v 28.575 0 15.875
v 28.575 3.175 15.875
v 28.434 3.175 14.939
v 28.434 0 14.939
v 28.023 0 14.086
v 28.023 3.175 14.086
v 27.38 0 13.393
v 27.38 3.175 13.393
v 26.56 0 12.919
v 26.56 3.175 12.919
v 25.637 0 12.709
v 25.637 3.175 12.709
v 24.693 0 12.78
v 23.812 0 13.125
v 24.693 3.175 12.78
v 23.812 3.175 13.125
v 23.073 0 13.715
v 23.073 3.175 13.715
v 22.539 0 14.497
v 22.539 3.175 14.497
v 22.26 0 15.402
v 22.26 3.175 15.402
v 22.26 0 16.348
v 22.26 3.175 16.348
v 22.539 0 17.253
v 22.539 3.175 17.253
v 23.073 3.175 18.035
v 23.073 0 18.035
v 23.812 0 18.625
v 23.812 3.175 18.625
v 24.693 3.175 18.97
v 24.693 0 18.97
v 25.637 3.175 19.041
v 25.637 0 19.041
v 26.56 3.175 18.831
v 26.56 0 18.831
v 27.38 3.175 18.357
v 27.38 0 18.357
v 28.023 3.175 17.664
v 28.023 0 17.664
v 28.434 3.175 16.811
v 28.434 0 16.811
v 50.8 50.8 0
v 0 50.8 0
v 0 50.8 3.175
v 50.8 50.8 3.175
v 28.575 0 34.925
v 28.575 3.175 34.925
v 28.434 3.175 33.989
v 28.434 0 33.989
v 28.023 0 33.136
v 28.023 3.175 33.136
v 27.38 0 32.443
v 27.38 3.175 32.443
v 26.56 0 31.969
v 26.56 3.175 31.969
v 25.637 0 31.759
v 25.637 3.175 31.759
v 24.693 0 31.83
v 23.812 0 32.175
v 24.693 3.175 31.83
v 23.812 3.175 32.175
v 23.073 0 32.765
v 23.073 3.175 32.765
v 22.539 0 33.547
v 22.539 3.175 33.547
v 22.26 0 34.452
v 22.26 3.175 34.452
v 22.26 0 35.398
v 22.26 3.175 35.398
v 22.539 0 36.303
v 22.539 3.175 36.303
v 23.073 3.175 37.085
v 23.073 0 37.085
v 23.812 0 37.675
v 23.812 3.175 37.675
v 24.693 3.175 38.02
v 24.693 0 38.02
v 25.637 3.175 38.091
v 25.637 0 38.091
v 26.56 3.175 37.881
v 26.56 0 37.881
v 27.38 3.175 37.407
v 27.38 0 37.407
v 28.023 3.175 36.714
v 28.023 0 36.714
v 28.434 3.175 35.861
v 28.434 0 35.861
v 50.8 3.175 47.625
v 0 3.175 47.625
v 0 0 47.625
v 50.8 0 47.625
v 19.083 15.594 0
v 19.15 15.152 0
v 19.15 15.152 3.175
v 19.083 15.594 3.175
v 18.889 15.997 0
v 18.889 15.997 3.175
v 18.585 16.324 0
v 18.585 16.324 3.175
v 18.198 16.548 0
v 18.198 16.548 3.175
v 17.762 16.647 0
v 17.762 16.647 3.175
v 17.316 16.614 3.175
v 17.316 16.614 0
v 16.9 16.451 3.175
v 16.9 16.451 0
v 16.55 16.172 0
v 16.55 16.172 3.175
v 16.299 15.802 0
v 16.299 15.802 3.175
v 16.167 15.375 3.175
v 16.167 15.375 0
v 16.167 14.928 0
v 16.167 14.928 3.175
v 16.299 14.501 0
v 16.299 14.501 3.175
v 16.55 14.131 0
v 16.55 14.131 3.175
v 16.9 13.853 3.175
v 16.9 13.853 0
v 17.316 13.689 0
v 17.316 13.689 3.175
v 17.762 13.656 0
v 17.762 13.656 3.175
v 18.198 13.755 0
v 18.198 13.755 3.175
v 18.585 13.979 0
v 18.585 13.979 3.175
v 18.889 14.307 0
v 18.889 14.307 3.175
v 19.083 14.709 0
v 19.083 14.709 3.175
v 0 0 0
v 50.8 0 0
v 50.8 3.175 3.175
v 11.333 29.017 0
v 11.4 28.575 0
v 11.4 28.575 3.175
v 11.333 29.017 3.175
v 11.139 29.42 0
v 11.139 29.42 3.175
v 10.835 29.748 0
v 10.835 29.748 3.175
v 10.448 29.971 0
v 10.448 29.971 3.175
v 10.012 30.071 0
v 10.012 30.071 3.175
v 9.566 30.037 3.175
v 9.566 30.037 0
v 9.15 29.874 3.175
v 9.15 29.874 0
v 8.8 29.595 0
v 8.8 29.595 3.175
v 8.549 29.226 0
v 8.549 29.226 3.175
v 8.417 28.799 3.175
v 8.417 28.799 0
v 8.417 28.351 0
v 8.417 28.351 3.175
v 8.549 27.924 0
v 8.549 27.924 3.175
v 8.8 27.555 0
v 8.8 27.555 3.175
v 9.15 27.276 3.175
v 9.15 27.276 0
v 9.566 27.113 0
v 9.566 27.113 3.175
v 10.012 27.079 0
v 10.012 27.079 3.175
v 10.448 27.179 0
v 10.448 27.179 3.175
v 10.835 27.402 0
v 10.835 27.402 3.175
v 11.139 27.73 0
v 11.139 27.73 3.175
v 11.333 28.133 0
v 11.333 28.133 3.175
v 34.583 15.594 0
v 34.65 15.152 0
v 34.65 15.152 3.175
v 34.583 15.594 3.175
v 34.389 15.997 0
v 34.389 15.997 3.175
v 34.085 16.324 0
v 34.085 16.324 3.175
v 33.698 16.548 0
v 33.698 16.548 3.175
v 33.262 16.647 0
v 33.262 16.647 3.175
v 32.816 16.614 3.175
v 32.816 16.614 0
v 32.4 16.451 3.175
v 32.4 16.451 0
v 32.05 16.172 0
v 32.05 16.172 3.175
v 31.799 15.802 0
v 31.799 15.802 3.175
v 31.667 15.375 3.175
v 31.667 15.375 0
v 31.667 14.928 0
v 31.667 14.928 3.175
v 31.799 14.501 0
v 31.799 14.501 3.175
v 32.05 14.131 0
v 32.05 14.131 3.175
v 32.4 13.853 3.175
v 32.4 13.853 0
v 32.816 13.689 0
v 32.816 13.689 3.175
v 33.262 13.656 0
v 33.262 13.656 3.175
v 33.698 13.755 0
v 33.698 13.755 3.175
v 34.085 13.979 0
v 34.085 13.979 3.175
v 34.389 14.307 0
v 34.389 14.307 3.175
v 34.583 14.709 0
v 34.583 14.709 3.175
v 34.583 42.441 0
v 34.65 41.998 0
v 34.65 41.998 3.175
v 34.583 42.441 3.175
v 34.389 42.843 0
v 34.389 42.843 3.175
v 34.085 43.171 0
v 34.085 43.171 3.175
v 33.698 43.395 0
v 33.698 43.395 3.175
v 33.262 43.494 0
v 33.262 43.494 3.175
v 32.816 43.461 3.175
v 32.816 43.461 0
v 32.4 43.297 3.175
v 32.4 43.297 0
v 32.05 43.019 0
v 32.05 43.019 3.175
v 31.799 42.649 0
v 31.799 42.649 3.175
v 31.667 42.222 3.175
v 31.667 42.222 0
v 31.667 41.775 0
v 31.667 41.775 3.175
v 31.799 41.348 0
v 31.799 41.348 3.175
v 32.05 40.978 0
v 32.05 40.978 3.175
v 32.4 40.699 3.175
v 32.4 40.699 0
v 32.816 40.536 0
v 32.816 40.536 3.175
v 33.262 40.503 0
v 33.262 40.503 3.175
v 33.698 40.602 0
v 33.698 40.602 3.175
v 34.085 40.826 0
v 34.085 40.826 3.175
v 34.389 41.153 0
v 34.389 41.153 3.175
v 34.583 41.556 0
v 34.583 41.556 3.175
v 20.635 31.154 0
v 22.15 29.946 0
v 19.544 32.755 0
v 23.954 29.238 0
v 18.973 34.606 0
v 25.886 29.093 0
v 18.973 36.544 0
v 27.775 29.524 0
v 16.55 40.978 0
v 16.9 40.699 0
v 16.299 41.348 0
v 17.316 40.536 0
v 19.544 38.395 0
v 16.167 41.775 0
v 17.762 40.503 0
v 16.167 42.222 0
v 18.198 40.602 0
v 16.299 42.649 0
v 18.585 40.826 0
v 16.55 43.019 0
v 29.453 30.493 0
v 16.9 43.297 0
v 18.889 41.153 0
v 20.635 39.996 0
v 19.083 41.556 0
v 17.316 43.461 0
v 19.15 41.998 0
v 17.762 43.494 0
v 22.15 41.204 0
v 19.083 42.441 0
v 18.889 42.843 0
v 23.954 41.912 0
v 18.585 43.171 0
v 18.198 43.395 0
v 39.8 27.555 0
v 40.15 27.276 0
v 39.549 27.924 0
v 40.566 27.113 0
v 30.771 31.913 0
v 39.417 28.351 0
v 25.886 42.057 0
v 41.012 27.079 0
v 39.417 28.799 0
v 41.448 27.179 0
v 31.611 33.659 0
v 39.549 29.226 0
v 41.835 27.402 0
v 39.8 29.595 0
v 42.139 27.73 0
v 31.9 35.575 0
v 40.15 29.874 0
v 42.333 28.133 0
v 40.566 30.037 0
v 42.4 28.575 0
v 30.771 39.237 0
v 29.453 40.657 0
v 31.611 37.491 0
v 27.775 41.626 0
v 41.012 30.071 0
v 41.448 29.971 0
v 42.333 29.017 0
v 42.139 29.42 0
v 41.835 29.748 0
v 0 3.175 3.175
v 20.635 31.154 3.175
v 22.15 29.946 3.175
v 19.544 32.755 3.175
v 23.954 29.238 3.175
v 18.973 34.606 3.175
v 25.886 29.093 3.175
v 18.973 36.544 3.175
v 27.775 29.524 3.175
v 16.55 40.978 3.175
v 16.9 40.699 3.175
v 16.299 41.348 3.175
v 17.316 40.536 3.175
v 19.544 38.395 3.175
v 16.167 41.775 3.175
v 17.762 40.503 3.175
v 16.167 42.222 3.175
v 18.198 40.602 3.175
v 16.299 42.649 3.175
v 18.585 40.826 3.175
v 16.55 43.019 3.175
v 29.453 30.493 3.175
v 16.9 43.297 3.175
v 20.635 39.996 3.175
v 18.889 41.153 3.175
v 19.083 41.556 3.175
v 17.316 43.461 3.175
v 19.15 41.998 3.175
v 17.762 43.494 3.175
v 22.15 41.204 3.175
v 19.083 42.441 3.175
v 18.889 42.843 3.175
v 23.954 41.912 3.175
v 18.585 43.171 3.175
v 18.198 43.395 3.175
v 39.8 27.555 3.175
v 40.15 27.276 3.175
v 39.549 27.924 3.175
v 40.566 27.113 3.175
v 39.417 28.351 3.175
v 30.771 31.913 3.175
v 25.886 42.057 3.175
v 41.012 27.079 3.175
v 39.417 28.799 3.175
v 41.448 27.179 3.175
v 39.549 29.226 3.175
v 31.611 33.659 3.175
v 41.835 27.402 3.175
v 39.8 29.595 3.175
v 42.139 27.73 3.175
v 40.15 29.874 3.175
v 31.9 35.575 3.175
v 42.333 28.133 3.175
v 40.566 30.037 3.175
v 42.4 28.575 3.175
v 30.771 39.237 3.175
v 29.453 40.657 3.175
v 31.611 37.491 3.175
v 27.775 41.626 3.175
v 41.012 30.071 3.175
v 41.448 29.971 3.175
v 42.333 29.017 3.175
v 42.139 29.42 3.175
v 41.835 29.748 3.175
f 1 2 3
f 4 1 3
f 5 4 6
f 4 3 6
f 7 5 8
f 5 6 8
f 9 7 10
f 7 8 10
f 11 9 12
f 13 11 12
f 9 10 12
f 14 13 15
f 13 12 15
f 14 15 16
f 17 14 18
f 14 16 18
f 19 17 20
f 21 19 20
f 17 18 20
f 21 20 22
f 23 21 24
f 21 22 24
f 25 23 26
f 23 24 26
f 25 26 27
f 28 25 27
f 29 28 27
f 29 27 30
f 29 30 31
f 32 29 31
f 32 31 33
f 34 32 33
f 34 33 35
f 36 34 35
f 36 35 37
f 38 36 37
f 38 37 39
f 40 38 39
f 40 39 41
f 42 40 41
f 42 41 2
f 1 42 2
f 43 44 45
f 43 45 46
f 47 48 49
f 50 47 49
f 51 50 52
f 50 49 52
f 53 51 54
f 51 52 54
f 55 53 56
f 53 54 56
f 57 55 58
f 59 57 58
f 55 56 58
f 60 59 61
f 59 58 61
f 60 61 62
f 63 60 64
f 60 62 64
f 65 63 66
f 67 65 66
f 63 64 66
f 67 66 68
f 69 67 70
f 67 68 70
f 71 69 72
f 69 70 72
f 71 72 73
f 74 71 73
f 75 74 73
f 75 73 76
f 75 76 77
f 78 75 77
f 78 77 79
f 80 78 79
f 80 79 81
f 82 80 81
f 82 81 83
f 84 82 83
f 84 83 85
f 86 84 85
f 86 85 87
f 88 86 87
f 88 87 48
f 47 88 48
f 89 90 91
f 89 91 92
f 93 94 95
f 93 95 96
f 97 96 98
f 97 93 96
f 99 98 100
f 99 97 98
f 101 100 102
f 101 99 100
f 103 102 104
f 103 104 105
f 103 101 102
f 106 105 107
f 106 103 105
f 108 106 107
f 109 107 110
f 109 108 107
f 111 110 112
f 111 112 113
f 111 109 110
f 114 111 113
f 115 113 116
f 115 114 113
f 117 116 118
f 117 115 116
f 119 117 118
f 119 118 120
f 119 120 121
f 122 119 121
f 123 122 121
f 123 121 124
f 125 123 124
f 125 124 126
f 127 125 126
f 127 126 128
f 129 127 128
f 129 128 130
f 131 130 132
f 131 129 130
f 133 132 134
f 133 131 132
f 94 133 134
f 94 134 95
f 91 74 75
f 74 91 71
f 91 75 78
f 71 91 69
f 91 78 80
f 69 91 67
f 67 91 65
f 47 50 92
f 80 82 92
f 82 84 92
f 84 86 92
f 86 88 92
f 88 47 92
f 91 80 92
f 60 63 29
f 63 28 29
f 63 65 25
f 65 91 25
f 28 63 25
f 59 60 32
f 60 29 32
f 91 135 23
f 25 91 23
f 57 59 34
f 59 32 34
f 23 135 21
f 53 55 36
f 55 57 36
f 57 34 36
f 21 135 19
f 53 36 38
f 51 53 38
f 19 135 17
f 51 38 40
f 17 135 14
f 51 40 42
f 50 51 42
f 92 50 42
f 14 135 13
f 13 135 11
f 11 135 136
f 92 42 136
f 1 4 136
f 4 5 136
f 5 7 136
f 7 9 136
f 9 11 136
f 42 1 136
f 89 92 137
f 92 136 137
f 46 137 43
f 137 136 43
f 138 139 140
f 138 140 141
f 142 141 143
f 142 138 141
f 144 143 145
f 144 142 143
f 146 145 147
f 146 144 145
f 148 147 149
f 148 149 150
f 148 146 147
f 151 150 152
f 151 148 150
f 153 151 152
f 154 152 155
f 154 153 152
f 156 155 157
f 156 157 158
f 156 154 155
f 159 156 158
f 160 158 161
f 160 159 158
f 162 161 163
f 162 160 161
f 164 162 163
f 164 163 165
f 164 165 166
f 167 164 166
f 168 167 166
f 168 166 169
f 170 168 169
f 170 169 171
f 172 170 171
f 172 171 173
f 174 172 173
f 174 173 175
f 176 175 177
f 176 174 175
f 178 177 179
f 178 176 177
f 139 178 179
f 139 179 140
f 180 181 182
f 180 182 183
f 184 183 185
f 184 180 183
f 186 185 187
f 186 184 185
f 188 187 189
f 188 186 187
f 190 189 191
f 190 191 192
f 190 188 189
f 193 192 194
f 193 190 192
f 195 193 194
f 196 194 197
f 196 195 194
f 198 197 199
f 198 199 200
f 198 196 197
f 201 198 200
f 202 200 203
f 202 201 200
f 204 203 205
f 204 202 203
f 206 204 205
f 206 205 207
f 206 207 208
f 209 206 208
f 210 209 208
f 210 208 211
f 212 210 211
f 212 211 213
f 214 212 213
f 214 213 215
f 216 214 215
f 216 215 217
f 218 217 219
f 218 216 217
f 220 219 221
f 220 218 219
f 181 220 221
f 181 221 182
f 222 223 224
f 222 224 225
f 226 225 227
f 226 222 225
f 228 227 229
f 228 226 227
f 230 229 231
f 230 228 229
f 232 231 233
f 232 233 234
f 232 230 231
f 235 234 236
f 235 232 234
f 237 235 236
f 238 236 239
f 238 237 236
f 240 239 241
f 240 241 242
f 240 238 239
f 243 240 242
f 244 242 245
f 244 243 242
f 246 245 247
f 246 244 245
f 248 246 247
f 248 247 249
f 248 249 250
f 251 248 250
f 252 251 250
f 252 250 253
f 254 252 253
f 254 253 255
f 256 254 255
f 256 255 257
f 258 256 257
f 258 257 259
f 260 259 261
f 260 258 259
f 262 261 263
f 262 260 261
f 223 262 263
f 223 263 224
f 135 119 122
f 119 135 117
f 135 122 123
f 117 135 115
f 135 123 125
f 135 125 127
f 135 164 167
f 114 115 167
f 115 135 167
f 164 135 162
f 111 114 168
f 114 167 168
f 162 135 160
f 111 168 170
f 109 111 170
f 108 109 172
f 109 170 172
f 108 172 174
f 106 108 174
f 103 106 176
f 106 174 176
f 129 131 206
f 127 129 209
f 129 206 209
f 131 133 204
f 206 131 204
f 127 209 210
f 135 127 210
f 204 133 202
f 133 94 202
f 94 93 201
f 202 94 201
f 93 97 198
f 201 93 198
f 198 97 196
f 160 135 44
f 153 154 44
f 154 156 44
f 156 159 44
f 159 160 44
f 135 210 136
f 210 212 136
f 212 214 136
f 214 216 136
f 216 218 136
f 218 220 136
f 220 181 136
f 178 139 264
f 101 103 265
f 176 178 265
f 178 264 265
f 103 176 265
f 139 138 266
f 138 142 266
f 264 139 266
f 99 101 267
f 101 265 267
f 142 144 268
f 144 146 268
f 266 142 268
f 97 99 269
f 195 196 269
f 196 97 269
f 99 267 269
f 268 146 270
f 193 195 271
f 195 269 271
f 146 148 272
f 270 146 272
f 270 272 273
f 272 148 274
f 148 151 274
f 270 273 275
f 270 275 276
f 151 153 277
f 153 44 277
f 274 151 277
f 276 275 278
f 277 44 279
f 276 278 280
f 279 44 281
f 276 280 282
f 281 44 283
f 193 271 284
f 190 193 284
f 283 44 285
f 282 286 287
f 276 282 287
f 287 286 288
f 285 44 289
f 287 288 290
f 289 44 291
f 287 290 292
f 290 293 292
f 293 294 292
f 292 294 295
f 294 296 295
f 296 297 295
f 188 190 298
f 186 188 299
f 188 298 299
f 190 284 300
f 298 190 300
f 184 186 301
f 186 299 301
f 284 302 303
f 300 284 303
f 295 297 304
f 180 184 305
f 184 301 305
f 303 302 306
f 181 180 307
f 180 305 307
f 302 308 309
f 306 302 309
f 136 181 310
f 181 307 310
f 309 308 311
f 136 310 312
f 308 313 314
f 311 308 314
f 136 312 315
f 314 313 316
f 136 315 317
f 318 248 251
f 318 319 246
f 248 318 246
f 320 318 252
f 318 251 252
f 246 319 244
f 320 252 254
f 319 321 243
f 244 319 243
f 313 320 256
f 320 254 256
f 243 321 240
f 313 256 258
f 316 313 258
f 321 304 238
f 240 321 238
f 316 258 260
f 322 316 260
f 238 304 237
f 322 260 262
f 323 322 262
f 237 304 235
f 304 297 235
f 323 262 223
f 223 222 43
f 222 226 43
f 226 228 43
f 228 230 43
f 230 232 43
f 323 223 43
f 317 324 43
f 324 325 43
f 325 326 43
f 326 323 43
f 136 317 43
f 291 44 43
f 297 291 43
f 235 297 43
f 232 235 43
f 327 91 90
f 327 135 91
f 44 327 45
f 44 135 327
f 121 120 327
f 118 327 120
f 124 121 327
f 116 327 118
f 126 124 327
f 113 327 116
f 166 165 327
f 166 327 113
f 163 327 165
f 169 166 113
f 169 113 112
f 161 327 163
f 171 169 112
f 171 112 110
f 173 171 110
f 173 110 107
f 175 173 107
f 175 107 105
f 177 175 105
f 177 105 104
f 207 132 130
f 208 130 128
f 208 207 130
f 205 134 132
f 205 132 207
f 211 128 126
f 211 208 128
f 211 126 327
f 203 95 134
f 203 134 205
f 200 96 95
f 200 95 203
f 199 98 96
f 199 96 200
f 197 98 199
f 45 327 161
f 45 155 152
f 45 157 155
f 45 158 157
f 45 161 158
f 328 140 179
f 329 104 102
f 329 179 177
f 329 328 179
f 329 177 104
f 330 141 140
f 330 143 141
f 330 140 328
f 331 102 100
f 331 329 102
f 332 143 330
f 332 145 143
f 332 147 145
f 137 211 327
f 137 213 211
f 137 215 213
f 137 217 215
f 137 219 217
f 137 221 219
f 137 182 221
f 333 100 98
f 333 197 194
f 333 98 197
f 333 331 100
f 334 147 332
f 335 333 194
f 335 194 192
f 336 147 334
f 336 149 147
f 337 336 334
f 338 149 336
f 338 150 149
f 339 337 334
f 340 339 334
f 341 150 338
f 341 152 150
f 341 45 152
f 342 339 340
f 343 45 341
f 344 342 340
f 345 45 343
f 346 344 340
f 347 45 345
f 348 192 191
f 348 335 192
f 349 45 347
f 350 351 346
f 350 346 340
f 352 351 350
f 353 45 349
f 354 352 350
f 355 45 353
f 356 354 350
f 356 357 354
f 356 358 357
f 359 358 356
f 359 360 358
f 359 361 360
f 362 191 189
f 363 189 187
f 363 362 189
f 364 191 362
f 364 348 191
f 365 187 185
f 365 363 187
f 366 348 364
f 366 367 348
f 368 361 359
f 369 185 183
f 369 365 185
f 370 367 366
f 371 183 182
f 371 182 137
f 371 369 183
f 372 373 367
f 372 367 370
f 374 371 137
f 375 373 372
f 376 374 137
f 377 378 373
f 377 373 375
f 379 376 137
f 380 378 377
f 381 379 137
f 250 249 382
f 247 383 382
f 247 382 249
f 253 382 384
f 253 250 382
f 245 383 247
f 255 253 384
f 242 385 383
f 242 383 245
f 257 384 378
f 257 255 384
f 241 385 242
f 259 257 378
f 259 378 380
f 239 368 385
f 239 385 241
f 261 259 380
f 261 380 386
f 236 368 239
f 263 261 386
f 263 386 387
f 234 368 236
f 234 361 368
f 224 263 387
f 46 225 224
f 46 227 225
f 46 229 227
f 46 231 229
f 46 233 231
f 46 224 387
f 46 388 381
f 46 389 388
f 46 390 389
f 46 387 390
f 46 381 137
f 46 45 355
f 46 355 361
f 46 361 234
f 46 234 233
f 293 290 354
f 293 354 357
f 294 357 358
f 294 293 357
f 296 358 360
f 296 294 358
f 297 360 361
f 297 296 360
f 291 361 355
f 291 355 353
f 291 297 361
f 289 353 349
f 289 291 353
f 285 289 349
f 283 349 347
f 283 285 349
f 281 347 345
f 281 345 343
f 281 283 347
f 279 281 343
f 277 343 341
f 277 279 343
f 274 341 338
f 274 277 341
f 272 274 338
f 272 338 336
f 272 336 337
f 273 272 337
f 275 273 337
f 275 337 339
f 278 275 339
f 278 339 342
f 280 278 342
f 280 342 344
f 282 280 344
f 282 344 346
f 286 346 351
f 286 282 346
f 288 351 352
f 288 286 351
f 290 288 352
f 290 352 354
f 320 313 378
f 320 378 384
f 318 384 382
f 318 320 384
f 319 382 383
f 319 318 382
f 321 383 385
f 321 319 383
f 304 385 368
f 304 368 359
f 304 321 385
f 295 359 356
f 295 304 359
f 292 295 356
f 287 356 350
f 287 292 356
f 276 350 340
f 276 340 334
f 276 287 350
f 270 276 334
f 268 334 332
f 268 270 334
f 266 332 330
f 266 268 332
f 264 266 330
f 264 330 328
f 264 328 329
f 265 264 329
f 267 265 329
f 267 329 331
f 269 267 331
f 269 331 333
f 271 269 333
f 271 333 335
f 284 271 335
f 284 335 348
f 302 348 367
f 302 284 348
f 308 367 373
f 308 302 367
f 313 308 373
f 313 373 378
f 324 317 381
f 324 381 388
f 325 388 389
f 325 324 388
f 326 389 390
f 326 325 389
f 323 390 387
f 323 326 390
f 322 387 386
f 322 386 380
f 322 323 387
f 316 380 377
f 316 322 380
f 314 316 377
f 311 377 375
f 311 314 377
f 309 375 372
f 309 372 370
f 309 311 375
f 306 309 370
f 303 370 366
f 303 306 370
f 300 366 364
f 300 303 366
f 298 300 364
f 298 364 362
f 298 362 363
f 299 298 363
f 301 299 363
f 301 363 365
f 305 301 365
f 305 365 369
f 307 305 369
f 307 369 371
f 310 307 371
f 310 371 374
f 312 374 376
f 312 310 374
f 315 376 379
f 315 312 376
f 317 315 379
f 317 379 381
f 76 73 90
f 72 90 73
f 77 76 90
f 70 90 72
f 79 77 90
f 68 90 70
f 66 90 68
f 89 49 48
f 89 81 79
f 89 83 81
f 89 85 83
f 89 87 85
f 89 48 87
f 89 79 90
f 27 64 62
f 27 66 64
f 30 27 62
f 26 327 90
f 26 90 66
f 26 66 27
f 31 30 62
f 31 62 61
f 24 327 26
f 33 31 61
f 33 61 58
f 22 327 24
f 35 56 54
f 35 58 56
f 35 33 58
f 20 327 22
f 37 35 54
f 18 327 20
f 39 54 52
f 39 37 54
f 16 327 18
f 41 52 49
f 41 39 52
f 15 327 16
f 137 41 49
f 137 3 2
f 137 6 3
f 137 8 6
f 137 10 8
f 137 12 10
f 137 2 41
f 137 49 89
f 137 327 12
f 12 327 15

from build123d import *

# Parameters (mm, degrees)
SKETCH1_W           = 50.8
SKETCH1_H           = 50.8
SKETCH1_R           = 6.5
SKETCH1_R_2         = 1.5
BOSS_EXTRUDE1_DEPTH = 3.175
SKETCH2_W           = 50.8
SKETCH2_H           = 3.175
BOSS_EXTRUDE2_DEPTH = 44.45
SKETCH3_R           = 3.175
CUT_EXTRUDE1_DEPTH  = 4.175


with BuildPart() as part:
    # Sketch1 → Boss-Extrude1 (new body)
    with BuildSketch(Plane.XY):
        with Locations((25.4, 25.4)):
            Rectangle(SKETCH1_W, SKETCH1_H)
        with Locations((25.4, 35.575)):
            Circle(SKETCH1_R, mode=Mode.SUBTRACT)
        with Locations((9.9, 28.575)):
            Circle(SKETCH1_R_2, mode=Mode.SUBTRACT)
        with Locations((40.9, 28.575)):
            Circle(SKETCH1_R_2, mode=Mode.SUBTRACT)
        with Locations((33.15, 15.151606241)):
            Circle(SKETCH1_R_2, mode=Mode.SUBTRACT)
        with Locations((17.65, 15.151606241)):
            Circle(SKETCH1_R_2, mode=Mode.SUBTRACT)
        with Locations((17.65, 41.998393759)):
            Circle(SKETCH1_R_2, mode=Mode.SUBTRACT)
        with Locations((33.15, 41.998393759)):
            Circle(SKETCH1_R_2, mode=Mode.SUBTRACT)
    extrude(amount=BOSS_EXTRUDE1_DEPTH)

    # Sketch2 → Boss-Extrude2 (add)
    with BuildSketch(Plane.XY.offset(3.175)):
        with Locations((25.4, 1.5875)):
            Rectangle(SKETCH2_W, SKETCH2_H)
    extrude(amount=BOSS_EXTRUDE2_DEPTH)

    # Sketch3 → Cut-Extrude1 (cut, through all)
    with BuildSketch(Plane(origin=(0, 3.175, 0), x_dir=(1, 0, 0), z_dir=(0, 1, 0))):
        with Locations((25.4, -15.875)):
            Circle(SKETCH3_R)
        with Locations((25.4, -34.925)):
            Circle(SKETCH3_R)
    extrude(amount=-CUT_EXTRUDE1_DEPTH, mode=Mode.SUBTRACT)


solid = part.part
